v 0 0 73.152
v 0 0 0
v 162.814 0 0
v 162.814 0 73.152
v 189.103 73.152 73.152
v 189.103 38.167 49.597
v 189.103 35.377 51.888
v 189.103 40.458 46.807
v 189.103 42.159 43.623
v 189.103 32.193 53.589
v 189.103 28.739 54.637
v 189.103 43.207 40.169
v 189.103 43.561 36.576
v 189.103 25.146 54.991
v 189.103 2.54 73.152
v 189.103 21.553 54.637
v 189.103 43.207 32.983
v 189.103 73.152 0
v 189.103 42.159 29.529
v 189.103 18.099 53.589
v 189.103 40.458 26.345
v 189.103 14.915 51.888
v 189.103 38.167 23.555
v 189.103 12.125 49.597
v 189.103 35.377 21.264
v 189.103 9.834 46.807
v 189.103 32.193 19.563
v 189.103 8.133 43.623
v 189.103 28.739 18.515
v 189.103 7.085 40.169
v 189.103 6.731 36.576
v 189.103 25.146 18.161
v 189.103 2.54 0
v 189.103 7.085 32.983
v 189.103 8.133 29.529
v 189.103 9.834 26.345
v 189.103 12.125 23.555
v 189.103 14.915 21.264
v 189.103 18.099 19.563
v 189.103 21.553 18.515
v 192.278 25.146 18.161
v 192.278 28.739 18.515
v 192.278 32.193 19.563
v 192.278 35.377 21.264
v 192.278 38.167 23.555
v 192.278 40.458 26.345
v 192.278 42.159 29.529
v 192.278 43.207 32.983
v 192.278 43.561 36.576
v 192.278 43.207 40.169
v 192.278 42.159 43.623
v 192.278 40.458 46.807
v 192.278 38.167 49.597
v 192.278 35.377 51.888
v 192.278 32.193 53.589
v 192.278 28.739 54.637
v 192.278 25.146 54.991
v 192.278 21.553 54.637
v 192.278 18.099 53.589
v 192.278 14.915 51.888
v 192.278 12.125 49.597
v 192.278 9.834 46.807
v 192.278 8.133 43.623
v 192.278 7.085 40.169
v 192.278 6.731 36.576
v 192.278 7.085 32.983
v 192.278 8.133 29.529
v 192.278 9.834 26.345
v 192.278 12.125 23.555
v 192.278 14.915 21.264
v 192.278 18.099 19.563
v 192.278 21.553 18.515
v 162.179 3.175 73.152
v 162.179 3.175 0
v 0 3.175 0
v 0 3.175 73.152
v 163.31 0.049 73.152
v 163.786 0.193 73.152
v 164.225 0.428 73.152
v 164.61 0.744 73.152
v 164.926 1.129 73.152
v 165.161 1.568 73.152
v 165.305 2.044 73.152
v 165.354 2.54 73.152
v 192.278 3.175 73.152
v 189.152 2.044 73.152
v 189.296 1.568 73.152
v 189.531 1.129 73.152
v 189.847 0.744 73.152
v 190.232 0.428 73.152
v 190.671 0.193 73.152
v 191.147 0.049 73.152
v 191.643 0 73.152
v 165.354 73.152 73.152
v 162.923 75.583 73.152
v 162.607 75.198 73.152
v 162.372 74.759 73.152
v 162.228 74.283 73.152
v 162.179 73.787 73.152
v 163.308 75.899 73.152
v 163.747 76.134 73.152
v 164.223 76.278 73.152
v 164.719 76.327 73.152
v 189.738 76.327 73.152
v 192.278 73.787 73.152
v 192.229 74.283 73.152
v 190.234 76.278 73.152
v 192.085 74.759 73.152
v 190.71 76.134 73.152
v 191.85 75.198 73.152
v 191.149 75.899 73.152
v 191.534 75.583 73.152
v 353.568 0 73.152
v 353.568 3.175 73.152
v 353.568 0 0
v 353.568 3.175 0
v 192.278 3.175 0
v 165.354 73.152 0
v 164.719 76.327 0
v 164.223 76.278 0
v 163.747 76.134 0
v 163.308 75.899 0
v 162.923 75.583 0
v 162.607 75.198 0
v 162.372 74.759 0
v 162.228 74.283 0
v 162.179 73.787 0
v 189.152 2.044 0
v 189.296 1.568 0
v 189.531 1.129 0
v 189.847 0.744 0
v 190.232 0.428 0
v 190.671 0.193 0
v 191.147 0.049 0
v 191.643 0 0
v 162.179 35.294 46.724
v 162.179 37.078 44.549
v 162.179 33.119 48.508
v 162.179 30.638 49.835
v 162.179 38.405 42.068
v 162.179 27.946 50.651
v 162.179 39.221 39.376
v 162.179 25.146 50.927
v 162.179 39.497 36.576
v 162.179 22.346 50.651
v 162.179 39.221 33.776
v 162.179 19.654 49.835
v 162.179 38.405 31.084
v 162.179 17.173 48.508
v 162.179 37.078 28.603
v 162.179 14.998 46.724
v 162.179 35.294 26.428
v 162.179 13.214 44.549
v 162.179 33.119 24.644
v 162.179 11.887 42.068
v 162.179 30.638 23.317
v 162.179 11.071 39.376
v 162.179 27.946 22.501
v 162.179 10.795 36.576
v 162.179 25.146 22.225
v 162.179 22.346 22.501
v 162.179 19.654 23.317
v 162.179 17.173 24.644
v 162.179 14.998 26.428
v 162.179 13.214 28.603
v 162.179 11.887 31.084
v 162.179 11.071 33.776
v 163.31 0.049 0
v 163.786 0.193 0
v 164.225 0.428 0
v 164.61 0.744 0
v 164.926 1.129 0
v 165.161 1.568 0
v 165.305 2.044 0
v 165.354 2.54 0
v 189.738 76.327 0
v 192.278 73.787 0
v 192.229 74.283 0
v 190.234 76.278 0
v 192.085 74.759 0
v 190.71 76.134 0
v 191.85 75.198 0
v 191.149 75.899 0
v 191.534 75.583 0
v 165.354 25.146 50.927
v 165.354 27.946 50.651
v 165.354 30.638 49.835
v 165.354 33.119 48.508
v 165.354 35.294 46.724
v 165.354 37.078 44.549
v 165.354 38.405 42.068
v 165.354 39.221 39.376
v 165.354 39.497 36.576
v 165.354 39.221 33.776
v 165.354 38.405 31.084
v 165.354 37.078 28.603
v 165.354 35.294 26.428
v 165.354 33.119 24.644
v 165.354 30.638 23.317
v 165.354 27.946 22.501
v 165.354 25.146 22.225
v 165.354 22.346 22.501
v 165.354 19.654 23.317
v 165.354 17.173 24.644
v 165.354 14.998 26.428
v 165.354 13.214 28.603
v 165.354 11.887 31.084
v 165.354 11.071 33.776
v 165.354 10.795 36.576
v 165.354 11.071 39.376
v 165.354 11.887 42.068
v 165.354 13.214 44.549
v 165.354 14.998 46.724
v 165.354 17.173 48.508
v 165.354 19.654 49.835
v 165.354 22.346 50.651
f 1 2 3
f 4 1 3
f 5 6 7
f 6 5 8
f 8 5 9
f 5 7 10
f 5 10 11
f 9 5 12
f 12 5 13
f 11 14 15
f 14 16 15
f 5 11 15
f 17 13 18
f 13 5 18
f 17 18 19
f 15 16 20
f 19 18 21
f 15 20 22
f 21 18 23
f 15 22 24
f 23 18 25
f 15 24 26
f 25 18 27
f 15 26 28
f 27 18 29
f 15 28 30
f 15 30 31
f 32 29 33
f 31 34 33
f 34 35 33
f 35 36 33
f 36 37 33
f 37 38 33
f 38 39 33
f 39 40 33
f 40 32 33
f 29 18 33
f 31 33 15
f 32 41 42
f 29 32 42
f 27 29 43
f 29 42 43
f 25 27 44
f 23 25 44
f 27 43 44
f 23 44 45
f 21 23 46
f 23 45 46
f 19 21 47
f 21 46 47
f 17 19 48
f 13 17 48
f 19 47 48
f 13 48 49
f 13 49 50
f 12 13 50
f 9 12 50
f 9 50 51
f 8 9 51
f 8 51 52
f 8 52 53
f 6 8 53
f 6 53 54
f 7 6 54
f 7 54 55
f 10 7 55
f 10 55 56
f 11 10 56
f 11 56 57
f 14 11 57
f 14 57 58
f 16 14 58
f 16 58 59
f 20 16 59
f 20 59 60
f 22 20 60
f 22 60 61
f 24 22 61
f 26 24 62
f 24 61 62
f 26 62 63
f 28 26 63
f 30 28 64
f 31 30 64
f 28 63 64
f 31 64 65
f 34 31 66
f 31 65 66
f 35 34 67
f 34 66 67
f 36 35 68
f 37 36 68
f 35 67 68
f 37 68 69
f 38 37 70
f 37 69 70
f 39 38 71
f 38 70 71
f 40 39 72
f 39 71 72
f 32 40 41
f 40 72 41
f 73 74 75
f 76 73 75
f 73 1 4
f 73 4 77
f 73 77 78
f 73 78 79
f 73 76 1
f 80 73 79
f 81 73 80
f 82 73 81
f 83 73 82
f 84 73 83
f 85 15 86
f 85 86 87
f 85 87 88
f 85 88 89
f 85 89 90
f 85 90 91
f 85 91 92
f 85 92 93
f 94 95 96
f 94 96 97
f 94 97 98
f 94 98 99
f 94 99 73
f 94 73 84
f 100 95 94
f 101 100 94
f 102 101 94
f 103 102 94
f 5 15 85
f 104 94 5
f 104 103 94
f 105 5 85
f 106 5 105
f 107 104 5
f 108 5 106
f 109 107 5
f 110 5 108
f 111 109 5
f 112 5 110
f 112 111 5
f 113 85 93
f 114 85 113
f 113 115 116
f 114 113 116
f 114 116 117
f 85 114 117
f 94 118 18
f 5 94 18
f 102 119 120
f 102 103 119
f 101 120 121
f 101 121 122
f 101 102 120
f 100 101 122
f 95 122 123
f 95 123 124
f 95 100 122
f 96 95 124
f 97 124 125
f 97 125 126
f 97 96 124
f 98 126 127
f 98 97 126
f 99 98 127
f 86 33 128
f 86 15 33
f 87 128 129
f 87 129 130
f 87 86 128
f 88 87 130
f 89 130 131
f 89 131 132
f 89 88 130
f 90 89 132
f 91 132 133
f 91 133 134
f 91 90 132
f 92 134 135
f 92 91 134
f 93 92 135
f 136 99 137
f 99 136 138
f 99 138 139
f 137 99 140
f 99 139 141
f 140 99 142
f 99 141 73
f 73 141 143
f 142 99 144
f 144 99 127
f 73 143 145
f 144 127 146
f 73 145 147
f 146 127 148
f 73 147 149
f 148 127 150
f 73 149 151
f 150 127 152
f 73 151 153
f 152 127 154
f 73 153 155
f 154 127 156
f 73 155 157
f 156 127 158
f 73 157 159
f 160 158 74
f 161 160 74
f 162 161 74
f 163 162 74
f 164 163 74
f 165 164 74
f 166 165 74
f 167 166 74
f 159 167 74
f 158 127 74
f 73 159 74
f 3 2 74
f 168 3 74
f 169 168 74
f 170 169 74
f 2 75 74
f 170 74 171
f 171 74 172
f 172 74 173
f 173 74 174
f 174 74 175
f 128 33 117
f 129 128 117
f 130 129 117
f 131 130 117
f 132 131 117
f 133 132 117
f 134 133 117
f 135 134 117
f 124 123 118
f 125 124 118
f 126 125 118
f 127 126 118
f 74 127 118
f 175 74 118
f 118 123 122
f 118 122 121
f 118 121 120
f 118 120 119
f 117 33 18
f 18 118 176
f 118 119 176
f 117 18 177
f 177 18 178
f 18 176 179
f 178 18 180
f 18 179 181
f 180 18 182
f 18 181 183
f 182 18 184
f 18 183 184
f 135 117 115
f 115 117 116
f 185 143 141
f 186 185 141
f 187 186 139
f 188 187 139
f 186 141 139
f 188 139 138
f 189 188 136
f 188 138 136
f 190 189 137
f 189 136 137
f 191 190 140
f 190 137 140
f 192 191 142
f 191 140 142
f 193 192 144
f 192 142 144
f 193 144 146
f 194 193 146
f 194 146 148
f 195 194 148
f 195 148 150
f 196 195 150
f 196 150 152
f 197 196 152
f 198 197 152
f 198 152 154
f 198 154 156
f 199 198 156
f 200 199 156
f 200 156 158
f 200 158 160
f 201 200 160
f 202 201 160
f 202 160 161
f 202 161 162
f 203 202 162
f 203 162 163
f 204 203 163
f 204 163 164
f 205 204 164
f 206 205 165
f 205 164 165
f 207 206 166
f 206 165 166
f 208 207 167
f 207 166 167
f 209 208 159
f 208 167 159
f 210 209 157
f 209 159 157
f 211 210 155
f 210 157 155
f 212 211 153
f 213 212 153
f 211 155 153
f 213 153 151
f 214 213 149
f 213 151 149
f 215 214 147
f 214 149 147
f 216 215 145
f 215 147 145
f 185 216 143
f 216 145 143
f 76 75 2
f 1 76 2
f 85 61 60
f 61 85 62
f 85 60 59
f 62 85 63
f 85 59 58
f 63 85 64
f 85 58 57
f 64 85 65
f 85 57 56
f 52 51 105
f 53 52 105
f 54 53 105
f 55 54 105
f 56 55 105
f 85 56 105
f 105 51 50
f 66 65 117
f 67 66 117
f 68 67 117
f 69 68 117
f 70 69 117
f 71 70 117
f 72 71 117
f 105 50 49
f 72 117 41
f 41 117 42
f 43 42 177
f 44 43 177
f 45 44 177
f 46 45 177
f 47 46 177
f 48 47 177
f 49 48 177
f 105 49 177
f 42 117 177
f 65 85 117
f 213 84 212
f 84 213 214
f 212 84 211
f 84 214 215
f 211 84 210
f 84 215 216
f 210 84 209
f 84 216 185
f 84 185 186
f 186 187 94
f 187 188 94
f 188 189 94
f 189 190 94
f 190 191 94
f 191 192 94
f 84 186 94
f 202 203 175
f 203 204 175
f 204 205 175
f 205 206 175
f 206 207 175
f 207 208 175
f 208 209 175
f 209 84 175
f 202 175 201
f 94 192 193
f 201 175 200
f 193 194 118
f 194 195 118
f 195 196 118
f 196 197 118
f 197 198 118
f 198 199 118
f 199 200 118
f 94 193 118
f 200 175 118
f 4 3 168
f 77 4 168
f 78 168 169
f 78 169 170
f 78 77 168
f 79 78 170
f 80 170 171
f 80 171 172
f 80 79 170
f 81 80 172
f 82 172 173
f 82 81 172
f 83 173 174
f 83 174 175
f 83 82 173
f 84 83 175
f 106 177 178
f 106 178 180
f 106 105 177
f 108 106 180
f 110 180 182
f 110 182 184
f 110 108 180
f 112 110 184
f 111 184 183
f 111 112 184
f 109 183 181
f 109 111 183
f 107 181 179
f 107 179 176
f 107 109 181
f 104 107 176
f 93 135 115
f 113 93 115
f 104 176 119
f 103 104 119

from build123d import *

# Parameters (mm, degrees)
BOSS_EXTRUDE1_DEPTH = 73.152
SKETCH2_R           = 14.351
CUT_EXTRUDE1_DEPTH  = 12.7
SKETCH3_R           = 18.415
CUT_EXTRUDE2_DEPTH  = 12.7
FILLET1_R           = 2.54


with BuildPart() as part:
    # Sketch1 → Boss-Extrude1 (new body)
    with BuildSketch(Plane.XY):
        Polygon((0, 0), (165.354, 0), (165.354, 73.152), (189.103, 73.152), (189.103, 0), (353.568, 0), (353.568, 3.175), (192.278, 3.175), (192.278, 76.327), (162.179, 76.327), (162.179, 3.175), (0, 3.175), align=None)
    extrude(amount=BOSS_EXTRUDE1_DEPTH)

    # Sketch2 → Cut-Extrude1 (cut)
    with BuildSketch(Plane.ZY.offset(-162.179)):
        with Locations((36.576, 25.146)):
            Circle(SKETCH2_R)
    extrude(amount=-CUT_EXTRUDE1_DEPTH, mode=Mode.SUBTRACT)

    # Sketch3 → Cut-Extrude2 (cut)
    with BuildSketch(Plane(origin=(192.278, 0, 0), x_dir=(0, 0, -1), z_dir=(1, 0, 0))):
        with Locations((-36.576, 25.146)):
            Circle(SKETCH3_R)
    extrude(amount=-CUT_EXTRUDE2_DEPTH, mode=Mode.SUBTRACT)

    # Fillet1
    fillet1_edges = [part.edges().sort_by_distance(p)[0] for p in [
        (162.179, 76.327, 36.576),
        (192.278, 76.327, 36.576),
        (189.103, 0, 36.576),
        (165.354, 0, 36.576),
    ]]
    fillet(fillet1_edges, radius=FILLET1_R)


solid = part.part
